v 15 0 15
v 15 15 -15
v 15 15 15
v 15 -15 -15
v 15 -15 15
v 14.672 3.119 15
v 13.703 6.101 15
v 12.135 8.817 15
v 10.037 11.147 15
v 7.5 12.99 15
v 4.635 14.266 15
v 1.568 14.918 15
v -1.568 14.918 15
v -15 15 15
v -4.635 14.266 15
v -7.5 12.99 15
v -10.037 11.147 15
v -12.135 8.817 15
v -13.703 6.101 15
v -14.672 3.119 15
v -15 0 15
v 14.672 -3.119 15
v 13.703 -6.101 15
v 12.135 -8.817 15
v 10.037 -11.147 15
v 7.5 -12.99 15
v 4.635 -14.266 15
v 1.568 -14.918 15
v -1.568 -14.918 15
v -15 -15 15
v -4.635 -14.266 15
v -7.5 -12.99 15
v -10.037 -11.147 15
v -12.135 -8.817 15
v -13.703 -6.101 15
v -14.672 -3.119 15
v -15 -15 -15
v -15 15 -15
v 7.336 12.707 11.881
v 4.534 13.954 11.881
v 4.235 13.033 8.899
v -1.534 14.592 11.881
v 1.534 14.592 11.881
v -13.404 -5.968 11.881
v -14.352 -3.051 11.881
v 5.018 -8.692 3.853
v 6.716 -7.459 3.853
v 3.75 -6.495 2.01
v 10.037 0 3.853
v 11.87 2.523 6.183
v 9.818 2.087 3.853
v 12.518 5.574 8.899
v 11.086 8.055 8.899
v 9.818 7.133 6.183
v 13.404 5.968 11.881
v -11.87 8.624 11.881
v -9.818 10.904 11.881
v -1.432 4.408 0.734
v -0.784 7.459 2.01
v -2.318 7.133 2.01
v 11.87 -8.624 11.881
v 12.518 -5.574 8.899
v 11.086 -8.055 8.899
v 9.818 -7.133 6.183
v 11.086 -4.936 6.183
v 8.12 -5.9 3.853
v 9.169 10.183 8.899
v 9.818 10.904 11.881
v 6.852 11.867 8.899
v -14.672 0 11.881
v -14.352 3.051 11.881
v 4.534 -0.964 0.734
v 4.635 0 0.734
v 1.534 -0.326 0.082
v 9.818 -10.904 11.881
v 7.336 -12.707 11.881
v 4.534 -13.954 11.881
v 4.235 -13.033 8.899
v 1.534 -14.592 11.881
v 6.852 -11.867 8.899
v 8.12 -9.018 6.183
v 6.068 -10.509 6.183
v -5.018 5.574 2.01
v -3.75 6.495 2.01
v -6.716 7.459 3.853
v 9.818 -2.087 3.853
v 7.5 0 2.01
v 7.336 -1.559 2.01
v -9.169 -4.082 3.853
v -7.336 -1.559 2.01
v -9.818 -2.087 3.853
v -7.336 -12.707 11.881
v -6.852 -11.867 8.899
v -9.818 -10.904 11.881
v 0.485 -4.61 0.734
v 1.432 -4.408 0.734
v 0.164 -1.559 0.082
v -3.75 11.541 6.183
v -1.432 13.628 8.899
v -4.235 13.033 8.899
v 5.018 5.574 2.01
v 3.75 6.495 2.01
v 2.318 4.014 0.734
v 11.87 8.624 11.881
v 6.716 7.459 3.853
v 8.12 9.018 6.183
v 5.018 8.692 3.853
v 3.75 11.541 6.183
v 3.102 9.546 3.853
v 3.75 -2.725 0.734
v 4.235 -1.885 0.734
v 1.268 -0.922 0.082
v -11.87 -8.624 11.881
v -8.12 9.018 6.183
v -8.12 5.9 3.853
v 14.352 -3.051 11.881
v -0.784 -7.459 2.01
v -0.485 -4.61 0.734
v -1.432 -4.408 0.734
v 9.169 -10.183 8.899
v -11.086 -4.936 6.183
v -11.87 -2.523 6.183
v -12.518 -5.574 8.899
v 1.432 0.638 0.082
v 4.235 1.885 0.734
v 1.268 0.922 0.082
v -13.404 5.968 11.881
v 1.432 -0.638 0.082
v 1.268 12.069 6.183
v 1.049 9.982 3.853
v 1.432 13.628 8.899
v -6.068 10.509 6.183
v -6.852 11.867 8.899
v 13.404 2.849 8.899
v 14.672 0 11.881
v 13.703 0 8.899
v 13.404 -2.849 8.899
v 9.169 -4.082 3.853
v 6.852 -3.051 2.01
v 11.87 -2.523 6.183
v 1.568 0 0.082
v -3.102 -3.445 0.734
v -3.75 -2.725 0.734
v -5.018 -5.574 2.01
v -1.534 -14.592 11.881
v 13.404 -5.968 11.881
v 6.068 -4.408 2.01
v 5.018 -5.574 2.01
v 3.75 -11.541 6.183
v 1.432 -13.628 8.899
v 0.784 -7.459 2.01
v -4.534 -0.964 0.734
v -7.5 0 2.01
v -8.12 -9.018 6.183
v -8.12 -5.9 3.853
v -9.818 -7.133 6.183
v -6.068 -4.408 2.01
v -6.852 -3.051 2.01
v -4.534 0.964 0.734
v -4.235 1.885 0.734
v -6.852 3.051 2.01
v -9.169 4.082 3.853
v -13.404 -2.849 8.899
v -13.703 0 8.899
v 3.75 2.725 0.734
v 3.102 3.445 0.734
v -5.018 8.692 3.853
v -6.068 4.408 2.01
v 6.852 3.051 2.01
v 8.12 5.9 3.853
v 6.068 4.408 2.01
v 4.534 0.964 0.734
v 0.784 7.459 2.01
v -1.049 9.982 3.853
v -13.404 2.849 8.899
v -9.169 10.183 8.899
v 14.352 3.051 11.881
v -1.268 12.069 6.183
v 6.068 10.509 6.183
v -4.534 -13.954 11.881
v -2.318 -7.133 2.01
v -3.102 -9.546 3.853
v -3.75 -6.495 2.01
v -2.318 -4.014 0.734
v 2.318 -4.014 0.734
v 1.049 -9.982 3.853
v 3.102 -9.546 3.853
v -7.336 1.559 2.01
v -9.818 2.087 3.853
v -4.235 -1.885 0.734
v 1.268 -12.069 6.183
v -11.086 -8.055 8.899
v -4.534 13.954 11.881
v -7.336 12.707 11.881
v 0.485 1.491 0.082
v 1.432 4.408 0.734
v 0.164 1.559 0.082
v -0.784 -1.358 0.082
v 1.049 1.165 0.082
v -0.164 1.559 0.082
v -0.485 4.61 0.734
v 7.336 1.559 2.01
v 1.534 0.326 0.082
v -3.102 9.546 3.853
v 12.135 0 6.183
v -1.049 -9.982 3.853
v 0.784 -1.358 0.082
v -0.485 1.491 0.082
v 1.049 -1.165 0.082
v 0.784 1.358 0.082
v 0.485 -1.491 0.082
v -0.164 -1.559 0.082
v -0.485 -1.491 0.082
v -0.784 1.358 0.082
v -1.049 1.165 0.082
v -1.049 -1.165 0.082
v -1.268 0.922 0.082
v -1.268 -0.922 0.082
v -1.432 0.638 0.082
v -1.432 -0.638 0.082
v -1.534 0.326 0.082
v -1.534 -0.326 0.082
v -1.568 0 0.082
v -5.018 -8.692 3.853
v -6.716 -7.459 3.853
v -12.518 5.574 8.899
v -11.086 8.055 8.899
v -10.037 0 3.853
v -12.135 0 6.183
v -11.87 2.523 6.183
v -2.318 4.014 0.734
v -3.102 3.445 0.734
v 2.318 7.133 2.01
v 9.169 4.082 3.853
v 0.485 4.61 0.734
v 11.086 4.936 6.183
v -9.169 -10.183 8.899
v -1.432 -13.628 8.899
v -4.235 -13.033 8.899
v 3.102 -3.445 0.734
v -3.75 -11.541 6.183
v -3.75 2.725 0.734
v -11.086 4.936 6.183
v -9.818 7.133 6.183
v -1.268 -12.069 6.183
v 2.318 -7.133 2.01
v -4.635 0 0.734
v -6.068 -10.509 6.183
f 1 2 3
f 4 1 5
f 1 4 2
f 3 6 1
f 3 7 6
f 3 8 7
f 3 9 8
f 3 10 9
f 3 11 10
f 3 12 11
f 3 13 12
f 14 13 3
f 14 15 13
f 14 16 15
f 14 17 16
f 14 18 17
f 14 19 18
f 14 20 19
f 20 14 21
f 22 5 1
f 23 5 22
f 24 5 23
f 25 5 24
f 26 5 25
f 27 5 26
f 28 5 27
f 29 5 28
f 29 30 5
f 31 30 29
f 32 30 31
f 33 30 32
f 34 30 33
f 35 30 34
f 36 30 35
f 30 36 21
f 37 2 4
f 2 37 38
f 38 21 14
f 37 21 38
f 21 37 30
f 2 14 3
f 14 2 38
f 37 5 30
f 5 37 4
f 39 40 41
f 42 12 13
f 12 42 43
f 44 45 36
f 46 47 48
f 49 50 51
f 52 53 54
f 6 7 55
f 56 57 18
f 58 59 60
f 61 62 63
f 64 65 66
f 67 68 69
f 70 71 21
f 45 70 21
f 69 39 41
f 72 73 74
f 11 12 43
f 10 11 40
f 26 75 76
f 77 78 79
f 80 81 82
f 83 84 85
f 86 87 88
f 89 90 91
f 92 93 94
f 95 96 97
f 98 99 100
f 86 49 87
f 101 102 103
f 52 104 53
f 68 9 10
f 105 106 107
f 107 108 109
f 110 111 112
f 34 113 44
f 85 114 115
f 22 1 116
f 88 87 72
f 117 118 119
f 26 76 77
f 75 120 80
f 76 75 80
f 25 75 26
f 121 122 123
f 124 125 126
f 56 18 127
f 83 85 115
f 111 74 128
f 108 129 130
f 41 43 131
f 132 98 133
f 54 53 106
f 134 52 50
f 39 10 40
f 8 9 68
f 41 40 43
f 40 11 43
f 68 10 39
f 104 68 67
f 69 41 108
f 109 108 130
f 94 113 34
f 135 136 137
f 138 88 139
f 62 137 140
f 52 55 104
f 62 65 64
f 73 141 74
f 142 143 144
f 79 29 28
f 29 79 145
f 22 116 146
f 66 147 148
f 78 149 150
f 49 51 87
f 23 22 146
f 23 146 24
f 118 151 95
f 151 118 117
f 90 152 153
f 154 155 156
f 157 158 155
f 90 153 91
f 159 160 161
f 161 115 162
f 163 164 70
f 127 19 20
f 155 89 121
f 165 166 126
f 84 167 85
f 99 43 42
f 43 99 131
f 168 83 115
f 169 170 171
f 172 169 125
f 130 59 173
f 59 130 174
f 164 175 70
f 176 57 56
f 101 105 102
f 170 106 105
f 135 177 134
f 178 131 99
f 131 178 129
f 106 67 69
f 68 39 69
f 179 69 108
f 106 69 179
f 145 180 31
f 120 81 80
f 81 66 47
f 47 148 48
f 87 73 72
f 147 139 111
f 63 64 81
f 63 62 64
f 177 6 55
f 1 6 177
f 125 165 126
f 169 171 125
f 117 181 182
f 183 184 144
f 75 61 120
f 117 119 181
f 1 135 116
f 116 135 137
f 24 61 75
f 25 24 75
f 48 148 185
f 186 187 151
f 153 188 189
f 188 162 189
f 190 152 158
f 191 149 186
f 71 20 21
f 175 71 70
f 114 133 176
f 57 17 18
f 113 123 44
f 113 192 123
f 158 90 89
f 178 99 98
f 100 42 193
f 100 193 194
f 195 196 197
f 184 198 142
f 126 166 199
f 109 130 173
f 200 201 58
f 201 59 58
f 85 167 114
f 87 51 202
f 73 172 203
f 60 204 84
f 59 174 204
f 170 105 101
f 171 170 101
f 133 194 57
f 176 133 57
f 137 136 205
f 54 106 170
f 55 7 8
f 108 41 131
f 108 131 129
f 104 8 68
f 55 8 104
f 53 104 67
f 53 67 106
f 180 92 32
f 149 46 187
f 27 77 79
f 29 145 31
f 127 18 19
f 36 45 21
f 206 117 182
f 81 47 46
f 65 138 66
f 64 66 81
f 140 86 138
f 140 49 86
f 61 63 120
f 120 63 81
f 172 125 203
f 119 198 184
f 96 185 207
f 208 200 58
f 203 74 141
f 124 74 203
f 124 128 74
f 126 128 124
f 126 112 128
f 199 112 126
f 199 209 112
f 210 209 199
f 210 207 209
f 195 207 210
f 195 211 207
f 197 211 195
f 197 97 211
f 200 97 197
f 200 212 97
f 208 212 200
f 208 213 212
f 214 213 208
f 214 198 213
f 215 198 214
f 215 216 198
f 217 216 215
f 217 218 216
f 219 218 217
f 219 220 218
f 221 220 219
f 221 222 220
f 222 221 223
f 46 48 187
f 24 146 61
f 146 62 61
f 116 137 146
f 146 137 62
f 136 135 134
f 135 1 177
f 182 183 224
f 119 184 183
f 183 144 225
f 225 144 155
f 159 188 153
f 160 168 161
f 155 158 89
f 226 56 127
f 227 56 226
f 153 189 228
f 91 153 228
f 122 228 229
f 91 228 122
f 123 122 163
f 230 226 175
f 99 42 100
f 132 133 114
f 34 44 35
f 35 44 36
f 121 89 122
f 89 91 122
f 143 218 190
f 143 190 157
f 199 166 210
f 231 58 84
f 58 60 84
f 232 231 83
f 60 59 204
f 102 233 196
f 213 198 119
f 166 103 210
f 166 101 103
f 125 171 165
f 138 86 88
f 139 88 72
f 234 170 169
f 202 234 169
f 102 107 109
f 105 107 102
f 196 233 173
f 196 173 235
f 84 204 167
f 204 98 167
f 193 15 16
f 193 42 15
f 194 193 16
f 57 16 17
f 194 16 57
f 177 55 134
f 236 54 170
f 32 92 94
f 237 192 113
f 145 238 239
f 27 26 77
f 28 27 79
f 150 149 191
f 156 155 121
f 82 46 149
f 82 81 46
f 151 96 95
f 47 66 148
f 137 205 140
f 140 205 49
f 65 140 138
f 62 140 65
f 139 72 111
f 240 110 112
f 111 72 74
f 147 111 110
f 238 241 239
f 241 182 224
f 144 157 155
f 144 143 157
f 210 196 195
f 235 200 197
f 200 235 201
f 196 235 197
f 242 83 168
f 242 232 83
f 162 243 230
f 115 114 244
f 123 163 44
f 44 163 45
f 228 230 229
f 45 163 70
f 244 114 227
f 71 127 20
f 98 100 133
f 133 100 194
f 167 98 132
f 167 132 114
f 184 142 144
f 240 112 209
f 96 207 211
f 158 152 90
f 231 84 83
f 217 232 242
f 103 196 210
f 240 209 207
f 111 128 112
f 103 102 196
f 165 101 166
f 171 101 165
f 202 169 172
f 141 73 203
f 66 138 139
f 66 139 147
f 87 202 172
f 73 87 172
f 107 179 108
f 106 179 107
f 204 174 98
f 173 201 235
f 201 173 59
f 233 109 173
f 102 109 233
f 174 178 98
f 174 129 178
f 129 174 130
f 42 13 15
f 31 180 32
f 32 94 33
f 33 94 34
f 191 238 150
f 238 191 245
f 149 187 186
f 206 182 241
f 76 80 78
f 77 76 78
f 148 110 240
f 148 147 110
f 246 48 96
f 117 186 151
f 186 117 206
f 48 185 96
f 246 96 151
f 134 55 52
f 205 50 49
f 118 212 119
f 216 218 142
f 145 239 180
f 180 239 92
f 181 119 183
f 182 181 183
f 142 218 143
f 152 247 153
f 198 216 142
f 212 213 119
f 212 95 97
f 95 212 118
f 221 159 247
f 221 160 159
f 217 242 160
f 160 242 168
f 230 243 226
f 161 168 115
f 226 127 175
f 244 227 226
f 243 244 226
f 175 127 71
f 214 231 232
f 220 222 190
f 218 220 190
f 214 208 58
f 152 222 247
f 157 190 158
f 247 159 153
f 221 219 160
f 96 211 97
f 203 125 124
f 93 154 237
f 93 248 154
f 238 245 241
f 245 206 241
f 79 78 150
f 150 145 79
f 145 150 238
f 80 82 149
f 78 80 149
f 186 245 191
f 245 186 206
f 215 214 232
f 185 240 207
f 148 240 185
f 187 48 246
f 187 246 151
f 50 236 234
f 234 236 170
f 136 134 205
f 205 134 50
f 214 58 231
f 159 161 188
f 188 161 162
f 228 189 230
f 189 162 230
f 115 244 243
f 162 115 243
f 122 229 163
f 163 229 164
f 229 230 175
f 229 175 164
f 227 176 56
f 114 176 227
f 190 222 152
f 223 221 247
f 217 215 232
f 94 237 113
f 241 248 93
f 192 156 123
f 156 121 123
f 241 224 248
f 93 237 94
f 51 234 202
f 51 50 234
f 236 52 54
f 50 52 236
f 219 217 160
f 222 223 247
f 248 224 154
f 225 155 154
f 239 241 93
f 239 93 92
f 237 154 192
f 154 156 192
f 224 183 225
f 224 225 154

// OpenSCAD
difference() {
    cube(30, center = true);
    translate([0, 0, 15])
    sphere(15, center = true);
//    sphere(10, center=true);
  
}
